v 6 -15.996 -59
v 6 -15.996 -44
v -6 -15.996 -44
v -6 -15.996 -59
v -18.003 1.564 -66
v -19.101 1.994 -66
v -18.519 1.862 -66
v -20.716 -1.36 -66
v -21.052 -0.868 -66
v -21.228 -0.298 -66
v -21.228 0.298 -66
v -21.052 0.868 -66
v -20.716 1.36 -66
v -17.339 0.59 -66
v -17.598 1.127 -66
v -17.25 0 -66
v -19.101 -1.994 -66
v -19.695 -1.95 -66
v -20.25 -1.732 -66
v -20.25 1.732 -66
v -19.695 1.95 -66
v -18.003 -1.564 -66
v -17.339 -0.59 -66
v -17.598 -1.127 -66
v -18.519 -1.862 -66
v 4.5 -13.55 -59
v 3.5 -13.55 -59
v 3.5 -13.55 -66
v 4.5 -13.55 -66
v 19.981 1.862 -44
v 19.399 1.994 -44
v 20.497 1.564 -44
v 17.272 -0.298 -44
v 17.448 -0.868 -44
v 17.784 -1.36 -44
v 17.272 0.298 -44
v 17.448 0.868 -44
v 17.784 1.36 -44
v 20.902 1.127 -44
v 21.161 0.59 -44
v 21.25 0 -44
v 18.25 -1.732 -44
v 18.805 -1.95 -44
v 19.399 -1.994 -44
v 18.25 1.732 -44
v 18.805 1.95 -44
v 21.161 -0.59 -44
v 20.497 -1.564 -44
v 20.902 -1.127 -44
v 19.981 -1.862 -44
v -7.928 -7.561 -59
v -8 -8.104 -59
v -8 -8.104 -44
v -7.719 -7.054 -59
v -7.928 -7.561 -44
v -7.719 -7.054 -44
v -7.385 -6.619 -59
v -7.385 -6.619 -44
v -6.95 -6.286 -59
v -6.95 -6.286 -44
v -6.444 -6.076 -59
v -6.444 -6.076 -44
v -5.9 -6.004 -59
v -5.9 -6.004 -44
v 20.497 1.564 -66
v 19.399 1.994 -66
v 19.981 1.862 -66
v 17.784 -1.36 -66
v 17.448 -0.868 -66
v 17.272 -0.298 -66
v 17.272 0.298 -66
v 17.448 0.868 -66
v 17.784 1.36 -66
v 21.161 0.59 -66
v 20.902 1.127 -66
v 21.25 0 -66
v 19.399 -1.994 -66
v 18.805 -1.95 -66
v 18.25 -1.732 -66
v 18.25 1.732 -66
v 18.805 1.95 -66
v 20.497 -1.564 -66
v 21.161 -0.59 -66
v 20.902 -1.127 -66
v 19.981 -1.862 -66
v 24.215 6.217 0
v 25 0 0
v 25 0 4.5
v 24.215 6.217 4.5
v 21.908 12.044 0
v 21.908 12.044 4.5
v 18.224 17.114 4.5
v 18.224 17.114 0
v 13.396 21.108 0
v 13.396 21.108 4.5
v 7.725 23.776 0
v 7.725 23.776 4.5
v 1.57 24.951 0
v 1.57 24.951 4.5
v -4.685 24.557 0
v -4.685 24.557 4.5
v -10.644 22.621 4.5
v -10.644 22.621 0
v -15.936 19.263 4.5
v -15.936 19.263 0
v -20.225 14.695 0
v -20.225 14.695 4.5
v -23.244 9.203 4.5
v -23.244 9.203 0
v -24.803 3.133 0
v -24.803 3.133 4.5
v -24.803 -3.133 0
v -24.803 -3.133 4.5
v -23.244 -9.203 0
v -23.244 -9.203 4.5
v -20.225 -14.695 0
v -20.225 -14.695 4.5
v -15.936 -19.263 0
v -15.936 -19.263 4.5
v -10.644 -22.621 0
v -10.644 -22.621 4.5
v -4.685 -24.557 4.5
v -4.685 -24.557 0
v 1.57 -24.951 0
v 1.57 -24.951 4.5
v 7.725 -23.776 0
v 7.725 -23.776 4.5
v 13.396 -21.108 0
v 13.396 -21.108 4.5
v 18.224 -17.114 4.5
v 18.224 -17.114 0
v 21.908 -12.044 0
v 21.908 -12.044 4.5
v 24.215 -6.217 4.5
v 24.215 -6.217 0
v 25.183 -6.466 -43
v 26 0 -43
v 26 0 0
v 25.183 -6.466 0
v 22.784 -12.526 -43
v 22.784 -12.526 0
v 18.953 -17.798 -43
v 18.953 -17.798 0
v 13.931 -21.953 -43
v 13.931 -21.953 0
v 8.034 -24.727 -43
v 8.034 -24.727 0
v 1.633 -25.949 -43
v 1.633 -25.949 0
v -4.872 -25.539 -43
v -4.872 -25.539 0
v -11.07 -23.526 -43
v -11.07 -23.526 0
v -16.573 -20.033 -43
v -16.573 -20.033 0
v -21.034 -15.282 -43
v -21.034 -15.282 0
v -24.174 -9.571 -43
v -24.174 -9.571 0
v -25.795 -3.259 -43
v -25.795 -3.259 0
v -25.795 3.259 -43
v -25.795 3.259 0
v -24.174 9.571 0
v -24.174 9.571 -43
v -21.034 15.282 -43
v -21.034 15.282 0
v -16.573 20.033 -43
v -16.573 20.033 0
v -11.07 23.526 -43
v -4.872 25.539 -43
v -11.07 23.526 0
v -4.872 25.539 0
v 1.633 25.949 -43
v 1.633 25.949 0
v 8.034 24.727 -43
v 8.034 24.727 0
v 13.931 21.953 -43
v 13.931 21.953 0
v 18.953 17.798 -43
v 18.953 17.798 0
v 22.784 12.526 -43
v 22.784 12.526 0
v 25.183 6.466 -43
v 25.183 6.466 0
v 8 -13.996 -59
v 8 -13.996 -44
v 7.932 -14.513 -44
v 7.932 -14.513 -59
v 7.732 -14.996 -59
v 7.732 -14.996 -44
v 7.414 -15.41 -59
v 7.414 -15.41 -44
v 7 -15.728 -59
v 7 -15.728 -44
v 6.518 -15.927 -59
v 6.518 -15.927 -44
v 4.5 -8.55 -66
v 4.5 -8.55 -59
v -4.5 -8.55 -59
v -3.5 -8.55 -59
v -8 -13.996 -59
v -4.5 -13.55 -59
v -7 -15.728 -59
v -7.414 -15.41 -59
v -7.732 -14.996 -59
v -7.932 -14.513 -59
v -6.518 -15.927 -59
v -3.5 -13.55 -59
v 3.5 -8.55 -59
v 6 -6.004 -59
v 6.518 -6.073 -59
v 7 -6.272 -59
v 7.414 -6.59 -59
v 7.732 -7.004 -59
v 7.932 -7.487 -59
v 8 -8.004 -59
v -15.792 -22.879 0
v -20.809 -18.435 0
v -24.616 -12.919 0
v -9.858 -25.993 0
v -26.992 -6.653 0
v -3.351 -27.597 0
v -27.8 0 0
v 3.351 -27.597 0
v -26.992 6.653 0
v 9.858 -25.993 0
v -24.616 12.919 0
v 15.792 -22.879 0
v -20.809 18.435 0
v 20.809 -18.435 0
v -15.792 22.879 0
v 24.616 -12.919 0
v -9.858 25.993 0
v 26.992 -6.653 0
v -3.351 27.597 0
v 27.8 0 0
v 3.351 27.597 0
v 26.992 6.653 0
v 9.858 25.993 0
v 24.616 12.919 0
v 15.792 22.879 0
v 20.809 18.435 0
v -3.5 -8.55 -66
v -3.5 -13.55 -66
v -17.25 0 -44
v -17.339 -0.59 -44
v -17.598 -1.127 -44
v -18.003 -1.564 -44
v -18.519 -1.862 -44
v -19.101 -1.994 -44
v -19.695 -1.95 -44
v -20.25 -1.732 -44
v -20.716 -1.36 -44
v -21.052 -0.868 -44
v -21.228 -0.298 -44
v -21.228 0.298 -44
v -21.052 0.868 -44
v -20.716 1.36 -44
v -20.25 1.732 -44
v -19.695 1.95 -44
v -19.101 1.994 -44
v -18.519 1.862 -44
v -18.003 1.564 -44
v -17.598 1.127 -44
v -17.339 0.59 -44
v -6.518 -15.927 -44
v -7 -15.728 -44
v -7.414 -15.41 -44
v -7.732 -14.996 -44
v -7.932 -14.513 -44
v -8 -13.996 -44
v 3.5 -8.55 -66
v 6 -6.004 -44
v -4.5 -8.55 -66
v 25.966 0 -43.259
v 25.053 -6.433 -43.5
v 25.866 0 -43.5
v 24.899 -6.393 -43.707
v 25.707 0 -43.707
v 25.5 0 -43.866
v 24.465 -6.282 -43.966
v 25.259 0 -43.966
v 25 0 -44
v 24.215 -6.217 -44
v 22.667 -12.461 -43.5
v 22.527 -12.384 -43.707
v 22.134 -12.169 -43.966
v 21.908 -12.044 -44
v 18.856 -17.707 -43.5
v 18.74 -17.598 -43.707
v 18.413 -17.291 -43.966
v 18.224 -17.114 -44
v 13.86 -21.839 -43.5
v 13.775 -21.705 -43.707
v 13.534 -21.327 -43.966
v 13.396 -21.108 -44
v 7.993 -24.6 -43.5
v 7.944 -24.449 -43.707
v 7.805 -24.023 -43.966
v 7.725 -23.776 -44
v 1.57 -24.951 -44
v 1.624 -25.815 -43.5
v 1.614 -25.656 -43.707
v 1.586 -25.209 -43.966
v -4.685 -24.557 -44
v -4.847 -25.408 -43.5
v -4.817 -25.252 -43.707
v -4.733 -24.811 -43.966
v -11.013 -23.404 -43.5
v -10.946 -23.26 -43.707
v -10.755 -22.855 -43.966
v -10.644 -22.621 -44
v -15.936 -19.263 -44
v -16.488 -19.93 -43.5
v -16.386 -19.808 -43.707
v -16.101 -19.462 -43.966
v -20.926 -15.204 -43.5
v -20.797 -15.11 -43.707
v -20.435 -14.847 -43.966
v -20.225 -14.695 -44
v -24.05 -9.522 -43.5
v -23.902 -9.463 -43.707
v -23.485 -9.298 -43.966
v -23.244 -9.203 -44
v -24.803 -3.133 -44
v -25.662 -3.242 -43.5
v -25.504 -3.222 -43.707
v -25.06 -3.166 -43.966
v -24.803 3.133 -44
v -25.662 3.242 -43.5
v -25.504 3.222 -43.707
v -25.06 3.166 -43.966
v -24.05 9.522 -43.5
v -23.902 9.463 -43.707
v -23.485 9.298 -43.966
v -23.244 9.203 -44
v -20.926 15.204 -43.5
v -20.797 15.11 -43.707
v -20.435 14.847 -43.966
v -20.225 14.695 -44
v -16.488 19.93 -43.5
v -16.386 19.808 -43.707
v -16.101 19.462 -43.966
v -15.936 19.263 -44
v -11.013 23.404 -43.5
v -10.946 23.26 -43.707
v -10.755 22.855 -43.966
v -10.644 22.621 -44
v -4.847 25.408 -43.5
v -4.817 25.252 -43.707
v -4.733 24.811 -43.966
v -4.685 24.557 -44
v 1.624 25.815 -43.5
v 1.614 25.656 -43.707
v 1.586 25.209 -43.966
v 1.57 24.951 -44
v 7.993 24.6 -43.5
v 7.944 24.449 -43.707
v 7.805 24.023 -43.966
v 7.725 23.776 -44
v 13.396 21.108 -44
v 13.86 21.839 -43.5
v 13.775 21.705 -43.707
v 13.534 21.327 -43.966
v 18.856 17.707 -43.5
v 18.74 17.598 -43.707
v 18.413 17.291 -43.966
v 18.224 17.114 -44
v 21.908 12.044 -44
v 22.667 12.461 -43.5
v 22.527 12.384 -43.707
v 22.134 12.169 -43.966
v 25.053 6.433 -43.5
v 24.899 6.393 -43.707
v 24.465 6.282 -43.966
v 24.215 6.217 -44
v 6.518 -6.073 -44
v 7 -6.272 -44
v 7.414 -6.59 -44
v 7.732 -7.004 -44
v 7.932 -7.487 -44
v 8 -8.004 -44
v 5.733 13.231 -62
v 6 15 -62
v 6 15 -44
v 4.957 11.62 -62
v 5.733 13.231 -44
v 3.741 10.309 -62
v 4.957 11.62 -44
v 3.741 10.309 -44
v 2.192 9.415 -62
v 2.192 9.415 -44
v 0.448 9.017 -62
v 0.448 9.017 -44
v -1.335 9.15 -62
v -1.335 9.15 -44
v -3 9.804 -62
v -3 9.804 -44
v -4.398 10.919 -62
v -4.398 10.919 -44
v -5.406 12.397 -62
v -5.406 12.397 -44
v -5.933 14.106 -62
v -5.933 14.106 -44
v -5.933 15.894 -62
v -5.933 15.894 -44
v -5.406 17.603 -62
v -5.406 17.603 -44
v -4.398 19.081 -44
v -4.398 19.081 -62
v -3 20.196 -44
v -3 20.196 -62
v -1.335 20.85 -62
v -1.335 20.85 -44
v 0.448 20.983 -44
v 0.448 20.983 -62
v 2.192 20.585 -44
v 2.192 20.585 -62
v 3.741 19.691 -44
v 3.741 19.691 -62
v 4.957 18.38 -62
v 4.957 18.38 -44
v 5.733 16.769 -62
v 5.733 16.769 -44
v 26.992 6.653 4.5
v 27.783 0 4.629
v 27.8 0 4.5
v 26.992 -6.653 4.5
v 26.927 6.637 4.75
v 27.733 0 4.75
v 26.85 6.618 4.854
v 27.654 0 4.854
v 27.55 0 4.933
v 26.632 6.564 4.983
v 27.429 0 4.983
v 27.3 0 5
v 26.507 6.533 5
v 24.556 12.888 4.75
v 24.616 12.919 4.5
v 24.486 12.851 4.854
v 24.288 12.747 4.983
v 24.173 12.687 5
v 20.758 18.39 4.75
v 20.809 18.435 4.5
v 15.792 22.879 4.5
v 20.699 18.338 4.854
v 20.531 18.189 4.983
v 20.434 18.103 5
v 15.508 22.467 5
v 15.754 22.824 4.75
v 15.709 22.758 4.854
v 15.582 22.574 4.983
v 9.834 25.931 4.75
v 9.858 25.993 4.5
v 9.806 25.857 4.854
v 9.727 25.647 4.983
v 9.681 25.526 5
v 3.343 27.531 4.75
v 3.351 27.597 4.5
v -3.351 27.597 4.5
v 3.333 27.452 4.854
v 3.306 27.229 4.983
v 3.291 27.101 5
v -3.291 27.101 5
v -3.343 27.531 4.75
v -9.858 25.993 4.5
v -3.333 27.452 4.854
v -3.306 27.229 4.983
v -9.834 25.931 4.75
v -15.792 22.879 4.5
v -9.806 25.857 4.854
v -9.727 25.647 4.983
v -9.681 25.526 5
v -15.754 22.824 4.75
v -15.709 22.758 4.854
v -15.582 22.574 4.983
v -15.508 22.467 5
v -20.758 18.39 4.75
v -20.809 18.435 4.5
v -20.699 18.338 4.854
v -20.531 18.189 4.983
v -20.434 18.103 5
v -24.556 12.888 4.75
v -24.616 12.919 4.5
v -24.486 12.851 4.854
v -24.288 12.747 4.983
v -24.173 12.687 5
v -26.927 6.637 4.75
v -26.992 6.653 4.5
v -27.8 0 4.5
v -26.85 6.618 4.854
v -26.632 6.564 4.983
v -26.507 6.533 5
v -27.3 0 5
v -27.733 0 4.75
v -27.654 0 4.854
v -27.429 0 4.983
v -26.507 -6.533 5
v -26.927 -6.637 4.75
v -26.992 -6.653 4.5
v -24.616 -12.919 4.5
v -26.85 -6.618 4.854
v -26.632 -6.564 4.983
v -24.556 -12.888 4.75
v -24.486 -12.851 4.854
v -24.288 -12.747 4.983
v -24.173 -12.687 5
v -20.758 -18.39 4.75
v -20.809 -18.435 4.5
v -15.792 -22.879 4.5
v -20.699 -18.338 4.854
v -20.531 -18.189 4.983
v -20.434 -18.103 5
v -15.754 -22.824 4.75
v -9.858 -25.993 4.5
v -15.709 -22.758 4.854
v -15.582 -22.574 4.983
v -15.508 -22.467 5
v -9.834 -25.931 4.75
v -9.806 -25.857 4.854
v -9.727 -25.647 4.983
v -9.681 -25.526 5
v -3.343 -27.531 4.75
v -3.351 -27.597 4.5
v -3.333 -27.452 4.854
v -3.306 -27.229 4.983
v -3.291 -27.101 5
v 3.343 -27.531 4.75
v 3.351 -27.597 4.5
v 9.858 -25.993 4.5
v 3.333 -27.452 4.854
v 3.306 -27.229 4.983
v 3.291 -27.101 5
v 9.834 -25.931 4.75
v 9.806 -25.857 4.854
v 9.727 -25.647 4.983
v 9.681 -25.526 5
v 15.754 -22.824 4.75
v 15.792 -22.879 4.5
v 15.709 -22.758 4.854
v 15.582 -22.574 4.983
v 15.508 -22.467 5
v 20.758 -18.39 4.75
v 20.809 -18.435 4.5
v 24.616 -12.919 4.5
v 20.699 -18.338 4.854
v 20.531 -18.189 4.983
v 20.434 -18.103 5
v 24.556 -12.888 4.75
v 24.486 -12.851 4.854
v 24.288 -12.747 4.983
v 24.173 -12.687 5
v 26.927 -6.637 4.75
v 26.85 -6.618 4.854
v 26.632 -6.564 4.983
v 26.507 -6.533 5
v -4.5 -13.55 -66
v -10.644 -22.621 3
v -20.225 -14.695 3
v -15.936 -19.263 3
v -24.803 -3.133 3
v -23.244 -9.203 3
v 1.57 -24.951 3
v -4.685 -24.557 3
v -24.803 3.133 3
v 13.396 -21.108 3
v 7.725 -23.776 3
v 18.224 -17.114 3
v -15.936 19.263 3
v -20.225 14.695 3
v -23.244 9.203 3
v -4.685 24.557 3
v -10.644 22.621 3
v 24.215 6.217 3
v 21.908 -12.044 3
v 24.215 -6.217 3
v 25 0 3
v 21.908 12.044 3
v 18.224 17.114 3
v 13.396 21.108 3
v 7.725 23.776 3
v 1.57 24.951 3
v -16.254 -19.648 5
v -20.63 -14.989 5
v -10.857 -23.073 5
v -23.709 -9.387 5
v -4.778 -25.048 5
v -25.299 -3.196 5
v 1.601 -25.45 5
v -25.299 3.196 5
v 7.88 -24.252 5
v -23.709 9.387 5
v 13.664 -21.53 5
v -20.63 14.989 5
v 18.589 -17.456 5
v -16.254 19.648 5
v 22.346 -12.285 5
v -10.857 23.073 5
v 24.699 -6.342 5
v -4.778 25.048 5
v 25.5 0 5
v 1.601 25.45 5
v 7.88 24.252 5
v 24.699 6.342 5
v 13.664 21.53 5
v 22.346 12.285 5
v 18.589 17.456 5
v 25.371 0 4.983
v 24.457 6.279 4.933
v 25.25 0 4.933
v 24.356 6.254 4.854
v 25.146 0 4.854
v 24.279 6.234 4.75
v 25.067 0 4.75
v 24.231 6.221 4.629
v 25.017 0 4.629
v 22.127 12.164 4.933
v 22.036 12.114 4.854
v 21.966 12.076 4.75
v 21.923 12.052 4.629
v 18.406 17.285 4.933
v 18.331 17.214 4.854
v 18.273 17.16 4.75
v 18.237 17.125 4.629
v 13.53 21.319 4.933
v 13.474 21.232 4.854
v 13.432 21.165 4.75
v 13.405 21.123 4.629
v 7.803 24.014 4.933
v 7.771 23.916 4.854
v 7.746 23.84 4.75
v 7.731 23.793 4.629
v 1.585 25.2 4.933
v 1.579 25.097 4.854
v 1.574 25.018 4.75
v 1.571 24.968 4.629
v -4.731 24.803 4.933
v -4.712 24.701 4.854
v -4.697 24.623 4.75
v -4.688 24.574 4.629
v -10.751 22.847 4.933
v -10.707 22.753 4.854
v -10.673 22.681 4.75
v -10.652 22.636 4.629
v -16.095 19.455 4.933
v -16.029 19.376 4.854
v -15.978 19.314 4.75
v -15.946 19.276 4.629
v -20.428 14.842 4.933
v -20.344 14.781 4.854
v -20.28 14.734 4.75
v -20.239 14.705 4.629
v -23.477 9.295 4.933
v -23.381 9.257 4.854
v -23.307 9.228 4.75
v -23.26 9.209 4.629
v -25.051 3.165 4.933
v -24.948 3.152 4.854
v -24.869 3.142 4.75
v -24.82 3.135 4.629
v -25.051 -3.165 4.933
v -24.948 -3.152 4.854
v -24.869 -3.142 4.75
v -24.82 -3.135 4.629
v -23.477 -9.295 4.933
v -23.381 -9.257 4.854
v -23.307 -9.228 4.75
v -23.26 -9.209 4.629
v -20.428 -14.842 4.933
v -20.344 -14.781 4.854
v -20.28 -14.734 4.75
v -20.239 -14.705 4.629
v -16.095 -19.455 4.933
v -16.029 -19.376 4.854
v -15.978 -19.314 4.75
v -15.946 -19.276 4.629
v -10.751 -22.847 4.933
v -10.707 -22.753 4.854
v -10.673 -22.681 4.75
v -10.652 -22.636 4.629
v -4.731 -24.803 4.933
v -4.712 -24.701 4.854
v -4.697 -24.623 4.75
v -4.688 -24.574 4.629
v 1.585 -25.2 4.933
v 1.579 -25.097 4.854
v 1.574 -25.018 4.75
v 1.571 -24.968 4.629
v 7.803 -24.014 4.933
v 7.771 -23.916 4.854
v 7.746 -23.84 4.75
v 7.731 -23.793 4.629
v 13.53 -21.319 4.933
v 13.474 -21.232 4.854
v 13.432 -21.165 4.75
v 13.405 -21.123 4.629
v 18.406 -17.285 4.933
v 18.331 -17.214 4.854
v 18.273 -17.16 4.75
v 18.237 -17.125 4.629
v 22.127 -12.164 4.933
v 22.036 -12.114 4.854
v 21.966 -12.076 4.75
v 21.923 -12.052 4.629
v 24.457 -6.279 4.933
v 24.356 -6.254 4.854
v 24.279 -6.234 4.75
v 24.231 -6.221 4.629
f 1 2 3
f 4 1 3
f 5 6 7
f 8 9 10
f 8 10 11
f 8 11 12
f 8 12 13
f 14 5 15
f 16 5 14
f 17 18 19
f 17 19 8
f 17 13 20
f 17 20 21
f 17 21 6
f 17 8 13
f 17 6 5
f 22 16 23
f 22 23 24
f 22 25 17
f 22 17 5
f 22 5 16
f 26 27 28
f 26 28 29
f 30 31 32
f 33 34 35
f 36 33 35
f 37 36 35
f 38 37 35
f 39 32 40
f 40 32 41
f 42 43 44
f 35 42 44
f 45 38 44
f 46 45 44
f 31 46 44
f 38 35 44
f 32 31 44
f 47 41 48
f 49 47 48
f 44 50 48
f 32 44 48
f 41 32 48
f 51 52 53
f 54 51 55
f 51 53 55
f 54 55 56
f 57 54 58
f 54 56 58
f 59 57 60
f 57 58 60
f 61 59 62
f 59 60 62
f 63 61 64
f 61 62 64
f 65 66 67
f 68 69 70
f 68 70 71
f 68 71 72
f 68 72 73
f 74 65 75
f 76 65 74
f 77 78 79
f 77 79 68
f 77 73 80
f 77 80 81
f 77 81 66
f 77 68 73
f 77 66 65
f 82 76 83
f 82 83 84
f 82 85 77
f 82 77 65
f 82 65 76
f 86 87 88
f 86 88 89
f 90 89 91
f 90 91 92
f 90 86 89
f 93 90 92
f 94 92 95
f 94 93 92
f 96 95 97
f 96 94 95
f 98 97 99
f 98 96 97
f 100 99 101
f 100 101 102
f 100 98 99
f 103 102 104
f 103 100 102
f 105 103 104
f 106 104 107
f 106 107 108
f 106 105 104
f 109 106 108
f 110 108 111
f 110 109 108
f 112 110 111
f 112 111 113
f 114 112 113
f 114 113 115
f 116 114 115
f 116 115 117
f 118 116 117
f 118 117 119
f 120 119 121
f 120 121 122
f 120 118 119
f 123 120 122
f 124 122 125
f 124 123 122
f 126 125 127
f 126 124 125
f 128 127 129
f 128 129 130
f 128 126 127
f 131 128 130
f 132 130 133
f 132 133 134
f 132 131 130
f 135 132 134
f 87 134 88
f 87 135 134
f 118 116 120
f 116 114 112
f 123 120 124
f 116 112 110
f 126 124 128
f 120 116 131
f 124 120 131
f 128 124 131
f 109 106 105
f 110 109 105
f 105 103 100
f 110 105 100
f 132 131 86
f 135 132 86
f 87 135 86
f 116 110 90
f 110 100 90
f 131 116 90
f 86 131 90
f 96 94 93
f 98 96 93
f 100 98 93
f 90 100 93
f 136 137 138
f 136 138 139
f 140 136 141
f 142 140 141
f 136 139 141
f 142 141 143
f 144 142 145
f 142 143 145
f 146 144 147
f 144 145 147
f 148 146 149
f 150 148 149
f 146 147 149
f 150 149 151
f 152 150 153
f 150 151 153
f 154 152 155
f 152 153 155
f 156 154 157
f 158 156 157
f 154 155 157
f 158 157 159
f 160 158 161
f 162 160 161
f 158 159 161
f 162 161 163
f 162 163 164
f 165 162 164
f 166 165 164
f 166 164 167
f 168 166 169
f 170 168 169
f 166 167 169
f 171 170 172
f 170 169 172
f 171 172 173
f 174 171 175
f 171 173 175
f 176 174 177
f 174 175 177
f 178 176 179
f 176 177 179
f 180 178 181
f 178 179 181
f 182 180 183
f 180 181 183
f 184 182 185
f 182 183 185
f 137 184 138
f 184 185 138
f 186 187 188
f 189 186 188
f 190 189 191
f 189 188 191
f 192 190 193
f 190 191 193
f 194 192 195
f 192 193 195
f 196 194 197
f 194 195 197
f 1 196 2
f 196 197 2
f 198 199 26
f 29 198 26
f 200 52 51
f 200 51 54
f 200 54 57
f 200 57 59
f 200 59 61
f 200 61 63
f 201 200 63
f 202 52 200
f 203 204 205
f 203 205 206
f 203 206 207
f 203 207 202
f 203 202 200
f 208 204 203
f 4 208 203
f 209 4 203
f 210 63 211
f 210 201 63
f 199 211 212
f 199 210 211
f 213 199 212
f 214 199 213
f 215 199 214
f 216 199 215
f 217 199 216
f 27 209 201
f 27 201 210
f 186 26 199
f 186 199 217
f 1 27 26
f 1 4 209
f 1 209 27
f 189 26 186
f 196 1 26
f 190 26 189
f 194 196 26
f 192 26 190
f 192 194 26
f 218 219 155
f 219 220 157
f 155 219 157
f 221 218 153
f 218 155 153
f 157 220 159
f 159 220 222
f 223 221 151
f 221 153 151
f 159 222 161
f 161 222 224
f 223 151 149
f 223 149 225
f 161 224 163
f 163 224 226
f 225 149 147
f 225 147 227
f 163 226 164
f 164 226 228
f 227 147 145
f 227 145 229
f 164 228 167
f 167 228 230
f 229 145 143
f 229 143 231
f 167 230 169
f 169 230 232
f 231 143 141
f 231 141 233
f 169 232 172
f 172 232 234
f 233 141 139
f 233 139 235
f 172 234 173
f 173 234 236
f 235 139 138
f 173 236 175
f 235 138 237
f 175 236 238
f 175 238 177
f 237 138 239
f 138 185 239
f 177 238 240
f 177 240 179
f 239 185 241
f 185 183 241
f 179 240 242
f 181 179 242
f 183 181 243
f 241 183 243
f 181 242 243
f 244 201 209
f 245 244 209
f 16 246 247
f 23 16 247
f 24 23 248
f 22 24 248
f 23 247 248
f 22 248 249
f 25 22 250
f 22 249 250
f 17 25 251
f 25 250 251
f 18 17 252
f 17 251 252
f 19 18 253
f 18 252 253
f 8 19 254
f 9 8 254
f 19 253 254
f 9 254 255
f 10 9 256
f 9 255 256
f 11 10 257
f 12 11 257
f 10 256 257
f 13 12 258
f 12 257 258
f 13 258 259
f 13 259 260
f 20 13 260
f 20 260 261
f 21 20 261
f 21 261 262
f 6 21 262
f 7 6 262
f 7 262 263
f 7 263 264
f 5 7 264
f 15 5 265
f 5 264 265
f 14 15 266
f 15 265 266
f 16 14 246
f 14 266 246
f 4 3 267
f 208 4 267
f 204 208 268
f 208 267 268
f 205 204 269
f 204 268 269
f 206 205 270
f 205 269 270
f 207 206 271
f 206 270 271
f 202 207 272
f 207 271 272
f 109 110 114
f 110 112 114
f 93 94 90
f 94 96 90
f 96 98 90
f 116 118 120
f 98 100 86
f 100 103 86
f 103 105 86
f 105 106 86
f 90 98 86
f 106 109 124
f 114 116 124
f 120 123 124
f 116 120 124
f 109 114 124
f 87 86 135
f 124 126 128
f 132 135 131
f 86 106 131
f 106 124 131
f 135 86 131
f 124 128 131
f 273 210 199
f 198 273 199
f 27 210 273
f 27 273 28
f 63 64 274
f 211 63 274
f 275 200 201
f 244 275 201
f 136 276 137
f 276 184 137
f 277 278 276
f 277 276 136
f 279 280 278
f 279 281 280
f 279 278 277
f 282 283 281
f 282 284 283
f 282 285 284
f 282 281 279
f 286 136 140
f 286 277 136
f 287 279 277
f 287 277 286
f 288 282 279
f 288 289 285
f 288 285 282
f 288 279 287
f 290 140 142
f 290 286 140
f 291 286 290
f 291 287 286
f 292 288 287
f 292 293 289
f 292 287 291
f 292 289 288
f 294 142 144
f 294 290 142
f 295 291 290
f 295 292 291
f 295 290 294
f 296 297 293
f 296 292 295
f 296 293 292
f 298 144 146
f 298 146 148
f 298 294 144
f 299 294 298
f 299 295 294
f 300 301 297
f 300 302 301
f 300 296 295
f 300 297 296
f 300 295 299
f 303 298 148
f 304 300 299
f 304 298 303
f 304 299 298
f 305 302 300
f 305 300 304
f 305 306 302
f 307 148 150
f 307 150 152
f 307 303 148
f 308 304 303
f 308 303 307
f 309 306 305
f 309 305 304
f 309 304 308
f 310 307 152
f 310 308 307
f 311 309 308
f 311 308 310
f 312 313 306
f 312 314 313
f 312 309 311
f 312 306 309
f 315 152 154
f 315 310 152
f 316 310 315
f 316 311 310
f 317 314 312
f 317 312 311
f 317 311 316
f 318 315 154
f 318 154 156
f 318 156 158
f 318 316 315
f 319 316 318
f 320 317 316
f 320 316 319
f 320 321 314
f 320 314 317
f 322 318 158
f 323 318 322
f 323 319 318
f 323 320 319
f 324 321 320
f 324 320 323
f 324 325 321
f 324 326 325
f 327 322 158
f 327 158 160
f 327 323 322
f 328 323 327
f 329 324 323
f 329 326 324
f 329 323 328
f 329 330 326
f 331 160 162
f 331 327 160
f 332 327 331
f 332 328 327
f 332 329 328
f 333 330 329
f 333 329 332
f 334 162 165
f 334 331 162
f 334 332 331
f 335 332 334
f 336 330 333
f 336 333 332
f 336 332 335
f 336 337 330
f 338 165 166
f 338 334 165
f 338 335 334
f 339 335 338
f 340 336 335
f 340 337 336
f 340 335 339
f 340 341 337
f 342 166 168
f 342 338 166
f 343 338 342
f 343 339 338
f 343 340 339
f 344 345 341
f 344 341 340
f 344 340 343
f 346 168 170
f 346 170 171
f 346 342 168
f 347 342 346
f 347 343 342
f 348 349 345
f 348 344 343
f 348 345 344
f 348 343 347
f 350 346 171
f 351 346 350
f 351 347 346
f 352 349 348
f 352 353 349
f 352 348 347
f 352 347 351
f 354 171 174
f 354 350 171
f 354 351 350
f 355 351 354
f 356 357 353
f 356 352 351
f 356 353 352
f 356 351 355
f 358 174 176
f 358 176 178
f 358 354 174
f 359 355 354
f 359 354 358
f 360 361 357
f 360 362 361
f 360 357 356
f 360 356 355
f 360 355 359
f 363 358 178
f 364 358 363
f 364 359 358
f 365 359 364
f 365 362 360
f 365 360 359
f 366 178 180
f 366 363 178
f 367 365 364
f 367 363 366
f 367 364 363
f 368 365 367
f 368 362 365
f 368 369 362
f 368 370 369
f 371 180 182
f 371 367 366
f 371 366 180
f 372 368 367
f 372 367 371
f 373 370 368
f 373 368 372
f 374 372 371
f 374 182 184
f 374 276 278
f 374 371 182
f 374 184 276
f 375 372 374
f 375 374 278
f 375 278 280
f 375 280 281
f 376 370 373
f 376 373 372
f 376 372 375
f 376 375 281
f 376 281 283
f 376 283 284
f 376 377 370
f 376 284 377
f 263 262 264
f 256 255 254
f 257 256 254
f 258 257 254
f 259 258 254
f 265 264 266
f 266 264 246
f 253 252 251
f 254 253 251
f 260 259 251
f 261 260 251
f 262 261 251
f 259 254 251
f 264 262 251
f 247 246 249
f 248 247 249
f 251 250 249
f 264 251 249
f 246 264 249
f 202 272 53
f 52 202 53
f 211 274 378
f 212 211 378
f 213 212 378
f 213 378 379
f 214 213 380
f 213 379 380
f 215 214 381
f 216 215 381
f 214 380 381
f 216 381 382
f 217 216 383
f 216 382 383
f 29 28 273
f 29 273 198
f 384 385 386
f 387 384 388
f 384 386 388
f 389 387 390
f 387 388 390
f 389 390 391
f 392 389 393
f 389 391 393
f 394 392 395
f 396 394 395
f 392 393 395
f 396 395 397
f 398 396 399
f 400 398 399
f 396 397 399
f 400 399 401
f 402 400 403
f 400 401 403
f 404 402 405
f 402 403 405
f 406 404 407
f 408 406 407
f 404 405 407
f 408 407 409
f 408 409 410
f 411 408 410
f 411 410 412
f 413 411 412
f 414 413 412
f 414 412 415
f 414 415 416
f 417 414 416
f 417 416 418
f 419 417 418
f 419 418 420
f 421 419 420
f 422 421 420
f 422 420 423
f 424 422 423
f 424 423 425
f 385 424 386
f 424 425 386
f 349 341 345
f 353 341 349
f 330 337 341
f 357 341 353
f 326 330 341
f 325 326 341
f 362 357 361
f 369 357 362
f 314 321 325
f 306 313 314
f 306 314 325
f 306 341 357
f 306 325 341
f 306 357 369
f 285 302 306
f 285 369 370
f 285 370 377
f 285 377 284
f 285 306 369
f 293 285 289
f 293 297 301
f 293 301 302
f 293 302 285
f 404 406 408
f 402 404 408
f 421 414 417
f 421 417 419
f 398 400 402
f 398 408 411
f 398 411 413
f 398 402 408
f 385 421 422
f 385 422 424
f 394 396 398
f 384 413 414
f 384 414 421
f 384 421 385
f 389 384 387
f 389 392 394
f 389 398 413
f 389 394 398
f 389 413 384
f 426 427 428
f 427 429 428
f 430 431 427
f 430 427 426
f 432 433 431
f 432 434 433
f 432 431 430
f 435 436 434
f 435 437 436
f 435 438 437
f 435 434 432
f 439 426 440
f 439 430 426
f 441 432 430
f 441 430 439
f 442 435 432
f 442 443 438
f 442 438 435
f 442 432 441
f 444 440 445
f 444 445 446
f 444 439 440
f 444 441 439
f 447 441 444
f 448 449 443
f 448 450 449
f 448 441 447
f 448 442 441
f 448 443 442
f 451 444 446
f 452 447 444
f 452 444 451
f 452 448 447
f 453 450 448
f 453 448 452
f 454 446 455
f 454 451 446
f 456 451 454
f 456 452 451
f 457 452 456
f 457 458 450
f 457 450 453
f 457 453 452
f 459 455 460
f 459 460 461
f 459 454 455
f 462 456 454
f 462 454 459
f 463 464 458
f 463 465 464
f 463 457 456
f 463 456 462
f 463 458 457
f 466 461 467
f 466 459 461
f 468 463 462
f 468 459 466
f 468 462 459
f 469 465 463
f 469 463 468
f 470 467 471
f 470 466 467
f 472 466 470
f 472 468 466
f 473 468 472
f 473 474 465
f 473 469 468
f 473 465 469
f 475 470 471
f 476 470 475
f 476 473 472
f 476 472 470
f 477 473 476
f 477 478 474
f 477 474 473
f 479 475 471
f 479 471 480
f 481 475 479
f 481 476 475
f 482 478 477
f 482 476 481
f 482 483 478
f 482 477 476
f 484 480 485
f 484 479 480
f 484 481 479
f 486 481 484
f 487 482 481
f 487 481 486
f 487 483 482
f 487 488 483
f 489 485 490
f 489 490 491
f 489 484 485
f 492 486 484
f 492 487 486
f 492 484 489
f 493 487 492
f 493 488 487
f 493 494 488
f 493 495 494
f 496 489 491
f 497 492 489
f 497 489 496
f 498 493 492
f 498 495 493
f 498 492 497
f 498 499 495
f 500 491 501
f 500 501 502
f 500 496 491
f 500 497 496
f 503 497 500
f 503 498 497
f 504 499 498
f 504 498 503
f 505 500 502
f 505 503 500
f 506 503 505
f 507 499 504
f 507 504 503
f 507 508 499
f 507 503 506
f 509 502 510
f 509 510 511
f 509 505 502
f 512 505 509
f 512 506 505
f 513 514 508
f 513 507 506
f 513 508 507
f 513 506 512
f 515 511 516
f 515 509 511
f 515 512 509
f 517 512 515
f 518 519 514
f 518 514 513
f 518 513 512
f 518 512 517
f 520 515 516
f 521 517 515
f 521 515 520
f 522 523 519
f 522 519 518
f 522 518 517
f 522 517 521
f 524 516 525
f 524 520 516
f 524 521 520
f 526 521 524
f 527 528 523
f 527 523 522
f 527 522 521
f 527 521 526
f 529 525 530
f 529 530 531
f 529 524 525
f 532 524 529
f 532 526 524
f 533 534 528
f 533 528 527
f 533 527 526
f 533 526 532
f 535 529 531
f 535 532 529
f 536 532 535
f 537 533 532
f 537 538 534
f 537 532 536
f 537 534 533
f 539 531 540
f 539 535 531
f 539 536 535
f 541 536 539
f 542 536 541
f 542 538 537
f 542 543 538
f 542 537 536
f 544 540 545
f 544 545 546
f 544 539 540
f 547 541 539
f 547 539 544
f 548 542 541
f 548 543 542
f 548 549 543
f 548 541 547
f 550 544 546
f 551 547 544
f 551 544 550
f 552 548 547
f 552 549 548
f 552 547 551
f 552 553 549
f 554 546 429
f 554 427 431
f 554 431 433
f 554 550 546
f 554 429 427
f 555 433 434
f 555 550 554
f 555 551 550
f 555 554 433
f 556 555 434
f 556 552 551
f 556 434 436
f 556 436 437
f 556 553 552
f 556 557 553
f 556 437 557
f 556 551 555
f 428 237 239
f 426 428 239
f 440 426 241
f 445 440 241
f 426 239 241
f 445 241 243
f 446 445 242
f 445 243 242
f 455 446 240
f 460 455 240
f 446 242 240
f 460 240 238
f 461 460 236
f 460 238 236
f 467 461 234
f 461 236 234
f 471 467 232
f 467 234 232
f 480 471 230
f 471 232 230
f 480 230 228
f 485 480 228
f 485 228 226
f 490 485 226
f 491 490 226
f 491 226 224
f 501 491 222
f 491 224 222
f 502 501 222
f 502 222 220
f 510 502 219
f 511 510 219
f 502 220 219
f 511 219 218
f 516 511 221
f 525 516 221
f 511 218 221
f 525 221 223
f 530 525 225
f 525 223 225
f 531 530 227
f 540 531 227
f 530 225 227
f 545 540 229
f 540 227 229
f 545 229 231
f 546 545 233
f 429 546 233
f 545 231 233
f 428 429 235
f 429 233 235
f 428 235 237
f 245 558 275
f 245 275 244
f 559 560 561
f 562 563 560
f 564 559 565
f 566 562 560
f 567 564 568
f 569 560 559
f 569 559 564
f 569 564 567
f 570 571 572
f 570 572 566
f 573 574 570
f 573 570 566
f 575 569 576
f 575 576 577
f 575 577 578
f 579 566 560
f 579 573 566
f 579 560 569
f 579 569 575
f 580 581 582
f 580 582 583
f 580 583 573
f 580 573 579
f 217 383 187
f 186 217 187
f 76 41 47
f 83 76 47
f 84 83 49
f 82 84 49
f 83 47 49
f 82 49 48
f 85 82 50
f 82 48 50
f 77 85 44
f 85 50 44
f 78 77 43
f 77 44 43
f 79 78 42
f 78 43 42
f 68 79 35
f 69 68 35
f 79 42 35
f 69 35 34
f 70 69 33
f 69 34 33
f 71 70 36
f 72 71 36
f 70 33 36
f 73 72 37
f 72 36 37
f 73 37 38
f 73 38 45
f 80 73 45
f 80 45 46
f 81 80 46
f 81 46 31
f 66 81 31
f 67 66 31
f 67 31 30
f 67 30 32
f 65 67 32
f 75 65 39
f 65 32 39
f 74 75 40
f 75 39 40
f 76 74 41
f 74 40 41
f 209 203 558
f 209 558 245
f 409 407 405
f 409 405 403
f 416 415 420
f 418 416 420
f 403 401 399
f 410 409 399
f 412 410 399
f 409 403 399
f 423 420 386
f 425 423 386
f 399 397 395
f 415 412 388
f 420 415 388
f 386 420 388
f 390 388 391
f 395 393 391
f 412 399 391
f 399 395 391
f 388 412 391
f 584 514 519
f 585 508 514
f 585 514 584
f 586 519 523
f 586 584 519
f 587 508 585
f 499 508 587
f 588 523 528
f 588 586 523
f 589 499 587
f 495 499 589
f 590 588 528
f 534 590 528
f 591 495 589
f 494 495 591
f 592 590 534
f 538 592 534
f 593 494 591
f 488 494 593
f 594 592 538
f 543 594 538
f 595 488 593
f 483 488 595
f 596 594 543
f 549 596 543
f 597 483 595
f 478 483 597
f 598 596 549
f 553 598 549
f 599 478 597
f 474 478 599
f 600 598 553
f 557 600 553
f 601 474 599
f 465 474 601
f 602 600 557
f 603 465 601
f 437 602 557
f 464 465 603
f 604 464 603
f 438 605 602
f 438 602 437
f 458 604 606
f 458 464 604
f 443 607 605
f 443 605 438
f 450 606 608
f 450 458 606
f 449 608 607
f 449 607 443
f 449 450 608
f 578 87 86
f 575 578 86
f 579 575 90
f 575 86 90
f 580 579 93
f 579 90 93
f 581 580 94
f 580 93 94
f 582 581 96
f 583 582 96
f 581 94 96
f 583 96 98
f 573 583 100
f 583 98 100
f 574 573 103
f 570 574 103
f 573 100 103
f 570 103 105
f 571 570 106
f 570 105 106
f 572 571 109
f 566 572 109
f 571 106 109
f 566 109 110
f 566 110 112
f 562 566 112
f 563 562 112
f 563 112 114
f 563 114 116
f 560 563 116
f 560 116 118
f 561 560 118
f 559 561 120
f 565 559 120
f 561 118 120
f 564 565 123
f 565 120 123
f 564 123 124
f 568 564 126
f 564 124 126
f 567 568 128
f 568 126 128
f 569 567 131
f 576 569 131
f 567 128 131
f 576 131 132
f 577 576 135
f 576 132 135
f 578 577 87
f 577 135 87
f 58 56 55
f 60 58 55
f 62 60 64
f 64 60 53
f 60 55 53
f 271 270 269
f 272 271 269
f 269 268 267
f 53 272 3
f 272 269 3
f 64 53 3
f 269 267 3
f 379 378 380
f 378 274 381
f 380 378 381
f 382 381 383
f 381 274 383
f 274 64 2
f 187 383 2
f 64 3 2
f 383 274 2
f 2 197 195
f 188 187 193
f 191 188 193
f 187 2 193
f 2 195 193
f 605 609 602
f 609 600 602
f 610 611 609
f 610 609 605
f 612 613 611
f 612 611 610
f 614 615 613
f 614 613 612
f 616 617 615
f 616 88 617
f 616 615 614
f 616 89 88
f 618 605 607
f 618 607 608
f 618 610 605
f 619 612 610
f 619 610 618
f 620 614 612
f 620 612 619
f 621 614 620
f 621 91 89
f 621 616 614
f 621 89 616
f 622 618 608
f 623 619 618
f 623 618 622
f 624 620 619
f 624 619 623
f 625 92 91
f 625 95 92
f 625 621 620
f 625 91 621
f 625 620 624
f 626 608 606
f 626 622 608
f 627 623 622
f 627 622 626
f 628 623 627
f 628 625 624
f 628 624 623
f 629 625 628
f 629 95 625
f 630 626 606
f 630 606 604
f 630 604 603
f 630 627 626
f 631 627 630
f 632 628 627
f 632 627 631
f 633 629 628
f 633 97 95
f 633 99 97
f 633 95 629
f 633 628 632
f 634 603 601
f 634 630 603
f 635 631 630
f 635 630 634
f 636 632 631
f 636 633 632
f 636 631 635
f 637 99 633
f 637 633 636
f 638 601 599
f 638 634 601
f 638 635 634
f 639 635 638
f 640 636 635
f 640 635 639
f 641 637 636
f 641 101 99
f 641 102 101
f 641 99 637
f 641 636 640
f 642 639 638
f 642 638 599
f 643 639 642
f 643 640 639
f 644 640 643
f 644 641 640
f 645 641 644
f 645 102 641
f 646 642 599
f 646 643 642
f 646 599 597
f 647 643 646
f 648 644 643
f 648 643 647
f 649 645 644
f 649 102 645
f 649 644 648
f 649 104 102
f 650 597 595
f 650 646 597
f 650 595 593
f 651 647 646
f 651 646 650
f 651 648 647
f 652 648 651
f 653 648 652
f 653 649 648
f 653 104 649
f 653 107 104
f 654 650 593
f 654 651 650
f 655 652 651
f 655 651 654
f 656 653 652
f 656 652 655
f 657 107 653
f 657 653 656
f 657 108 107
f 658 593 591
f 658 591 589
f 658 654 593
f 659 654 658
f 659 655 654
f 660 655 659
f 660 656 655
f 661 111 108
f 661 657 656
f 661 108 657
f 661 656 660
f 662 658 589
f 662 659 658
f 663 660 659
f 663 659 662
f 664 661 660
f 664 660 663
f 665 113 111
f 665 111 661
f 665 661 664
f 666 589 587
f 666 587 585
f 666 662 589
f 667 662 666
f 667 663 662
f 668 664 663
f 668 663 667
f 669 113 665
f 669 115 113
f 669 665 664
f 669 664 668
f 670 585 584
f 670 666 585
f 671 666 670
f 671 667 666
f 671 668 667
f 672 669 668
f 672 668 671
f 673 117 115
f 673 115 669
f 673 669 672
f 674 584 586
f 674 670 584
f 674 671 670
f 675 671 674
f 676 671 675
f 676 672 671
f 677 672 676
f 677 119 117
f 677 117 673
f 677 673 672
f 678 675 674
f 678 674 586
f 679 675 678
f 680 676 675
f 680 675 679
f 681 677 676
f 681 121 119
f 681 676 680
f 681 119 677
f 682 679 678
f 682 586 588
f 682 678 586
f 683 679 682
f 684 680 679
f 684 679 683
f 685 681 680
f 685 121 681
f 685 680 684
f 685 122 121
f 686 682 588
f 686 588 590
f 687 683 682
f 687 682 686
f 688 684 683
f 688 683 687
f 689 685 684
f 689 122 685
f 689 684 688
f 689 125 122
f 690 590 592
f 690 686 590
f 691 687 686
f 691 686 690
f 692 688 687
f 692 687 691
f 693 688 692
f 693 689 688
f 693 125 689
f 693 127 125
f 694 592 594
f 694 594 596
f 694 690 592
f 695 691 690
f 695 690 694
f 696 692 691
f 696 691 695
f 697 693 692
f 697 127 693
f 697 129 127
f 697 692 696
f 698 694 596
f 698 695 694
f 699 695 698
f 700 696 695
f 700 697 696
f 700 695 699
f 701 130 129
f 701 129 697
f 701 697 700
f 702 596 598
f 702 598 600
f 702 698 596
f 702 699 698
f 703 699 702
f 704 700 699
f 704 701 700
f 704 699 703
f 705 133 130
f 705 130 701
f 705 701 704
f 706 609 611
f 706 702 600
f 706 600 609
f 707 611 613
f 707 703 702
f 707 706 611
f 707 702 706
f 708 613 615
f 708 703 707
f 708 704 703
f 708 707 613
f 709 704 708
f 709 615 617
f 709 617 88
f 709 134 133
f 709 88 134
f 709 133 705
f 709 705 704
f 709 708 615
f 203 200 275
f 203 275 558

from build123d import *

# Parameters (mm, degrees)
F0_R      = 27.8
F0_R_2    = 25
F1_DEPTH  = 5
F2_R      = 25
F3_DEPTH  = 3
F4_R      = 26
F5_DEPTH  = 44
F6_R      = 1
F7_R      = 2
F8_DEPTH  = 22
F10_DEPTH = 15
F11_R     = 6
F12_DEPTH = 18
F13_W     = 1
F13_H     = 5
F14_DEPTH = 7
F15_R     = 0.5


with BuildPart() as f1:
    # F0 (on Top) → F1 (new body)
    with BuildSketch(Plane.XY):
        Circle(F0_R)
        Circle(F0_R_2, mode=Mode.SUBTRACT)
    extrude(amount=F1_DEPTH)

    # F4 (on face) → F5 (join)
    with BuildSketch(Plane(origin=(0, 0, 0), x_dir=(1, 0, 0), z_dir=(0, 0, -1))):
        Circle(F4_R)
    extrude(amount=F5_DEPTH)

    # F6
    f6_edges = [f1.edges().sort_by_distance(p)[0] for p in [
        (-26, 0, -44),
    ]]
    fillet(f6_edges, radius=F6_R)

    # F15
    f15_edges = [f1.edges().sort_by_distance(p)[0] for p in [
        (-27.8, 0, 5),
        (-25, 0, 5),
    ]]
    fillet(f15_edges, radius=F15_R)


with BuildPart() as f3:
    # F2 (on Top) → F3 (new body)
    with BuildSketch(Plane.XY):
        Circle(F2_R)
    extrude(amount=F3_DEPTH)


with BuildPart() as f8:
    # F7 (on face) → F8 (new body)
    with BuildSketch(Plane(origin=(0, 0, -44), x_dir=(1, 0, 0), z_dir=(0, 0, -1))):
        with Locations((-19.25, 0)):
            Circle(F7_R)
    extrude(amount=F8_DEPTH)


with BuildPart() as f8b:
    # F7 (on face) → F8, piece 2 (new body)
    with BuildSketch(Plane(origin=(0, 0, -44), x_dir=(1, 0, 0), z_dir=(0, 0, -1))):
        with Locations((19.25, 0)):
            Circle(F7_R)
    extrude(amount=F8_DEPTH)


with BuildPart() as f10:
    # F9 (on face) → F10 (new body)
    with BuildSketch(Plane(origin=(0, 0, -44), x_dir=(1, 0, 0), z_dir=(0, 0, -1))):
        with BuildLine():
            Line((-5.9, 6.0043991543), (6, 6.0043991543))
            ThreePointArc((6, 6.0043991543), (7.4142135624, 6.590185592), (8, 8.0043991543))
            Line((8, 8.0043991543), (8, 13.9956008457))
            ThreePointArc((8, 13.9956008457), (7.4142135624, 15.409814408), (6, 15.9956008457))
            Line((6, 15.9956008457), (-6, 15.9956008457))
            ThreePointArc((-6, 15.9956008457), (-7.4142135624, 15.409814408), (-8, 13.9956008457))
            Line((-8, 13.9956008457), (-8, 8.1043991543))
            ThreePointArc((-8, 8.1043991543), (-7.3849242405, 6.6194749138), (-5.9, 6.0043991543))
        make_face()
    extrude(amount=F10_DEPTH)

    # F13 (on face) → F14 (join)
    with BuildSketch(Plane(origin=(0, 0, -59), x_dir=(1, 0, 0), z_dir=(0, 0, -1))):
        with Locations((-4, 11.05)):
            Rectangle(F13_W, F13_H)
        with Locations((4, 11.05)):
            Rectangle(F13_W, F13_H)
    extrude(amount=F14_DEPTH)


with BuildPart() as f12:
    # F11 (on face) → F12 (new body)
    with BuildSketch(Plane(origin=(0, 0, -44), x_dir=(1, 0, 0), z_dir=(0, 0, -1))):
        with Locations((0, -15)):
            Circle(F11_R)
    extrude(amount=F12_DEPTH)


solid = Compound([f1.part, f3.part, f8.part, f8b.part, f10.part, f12.part])
